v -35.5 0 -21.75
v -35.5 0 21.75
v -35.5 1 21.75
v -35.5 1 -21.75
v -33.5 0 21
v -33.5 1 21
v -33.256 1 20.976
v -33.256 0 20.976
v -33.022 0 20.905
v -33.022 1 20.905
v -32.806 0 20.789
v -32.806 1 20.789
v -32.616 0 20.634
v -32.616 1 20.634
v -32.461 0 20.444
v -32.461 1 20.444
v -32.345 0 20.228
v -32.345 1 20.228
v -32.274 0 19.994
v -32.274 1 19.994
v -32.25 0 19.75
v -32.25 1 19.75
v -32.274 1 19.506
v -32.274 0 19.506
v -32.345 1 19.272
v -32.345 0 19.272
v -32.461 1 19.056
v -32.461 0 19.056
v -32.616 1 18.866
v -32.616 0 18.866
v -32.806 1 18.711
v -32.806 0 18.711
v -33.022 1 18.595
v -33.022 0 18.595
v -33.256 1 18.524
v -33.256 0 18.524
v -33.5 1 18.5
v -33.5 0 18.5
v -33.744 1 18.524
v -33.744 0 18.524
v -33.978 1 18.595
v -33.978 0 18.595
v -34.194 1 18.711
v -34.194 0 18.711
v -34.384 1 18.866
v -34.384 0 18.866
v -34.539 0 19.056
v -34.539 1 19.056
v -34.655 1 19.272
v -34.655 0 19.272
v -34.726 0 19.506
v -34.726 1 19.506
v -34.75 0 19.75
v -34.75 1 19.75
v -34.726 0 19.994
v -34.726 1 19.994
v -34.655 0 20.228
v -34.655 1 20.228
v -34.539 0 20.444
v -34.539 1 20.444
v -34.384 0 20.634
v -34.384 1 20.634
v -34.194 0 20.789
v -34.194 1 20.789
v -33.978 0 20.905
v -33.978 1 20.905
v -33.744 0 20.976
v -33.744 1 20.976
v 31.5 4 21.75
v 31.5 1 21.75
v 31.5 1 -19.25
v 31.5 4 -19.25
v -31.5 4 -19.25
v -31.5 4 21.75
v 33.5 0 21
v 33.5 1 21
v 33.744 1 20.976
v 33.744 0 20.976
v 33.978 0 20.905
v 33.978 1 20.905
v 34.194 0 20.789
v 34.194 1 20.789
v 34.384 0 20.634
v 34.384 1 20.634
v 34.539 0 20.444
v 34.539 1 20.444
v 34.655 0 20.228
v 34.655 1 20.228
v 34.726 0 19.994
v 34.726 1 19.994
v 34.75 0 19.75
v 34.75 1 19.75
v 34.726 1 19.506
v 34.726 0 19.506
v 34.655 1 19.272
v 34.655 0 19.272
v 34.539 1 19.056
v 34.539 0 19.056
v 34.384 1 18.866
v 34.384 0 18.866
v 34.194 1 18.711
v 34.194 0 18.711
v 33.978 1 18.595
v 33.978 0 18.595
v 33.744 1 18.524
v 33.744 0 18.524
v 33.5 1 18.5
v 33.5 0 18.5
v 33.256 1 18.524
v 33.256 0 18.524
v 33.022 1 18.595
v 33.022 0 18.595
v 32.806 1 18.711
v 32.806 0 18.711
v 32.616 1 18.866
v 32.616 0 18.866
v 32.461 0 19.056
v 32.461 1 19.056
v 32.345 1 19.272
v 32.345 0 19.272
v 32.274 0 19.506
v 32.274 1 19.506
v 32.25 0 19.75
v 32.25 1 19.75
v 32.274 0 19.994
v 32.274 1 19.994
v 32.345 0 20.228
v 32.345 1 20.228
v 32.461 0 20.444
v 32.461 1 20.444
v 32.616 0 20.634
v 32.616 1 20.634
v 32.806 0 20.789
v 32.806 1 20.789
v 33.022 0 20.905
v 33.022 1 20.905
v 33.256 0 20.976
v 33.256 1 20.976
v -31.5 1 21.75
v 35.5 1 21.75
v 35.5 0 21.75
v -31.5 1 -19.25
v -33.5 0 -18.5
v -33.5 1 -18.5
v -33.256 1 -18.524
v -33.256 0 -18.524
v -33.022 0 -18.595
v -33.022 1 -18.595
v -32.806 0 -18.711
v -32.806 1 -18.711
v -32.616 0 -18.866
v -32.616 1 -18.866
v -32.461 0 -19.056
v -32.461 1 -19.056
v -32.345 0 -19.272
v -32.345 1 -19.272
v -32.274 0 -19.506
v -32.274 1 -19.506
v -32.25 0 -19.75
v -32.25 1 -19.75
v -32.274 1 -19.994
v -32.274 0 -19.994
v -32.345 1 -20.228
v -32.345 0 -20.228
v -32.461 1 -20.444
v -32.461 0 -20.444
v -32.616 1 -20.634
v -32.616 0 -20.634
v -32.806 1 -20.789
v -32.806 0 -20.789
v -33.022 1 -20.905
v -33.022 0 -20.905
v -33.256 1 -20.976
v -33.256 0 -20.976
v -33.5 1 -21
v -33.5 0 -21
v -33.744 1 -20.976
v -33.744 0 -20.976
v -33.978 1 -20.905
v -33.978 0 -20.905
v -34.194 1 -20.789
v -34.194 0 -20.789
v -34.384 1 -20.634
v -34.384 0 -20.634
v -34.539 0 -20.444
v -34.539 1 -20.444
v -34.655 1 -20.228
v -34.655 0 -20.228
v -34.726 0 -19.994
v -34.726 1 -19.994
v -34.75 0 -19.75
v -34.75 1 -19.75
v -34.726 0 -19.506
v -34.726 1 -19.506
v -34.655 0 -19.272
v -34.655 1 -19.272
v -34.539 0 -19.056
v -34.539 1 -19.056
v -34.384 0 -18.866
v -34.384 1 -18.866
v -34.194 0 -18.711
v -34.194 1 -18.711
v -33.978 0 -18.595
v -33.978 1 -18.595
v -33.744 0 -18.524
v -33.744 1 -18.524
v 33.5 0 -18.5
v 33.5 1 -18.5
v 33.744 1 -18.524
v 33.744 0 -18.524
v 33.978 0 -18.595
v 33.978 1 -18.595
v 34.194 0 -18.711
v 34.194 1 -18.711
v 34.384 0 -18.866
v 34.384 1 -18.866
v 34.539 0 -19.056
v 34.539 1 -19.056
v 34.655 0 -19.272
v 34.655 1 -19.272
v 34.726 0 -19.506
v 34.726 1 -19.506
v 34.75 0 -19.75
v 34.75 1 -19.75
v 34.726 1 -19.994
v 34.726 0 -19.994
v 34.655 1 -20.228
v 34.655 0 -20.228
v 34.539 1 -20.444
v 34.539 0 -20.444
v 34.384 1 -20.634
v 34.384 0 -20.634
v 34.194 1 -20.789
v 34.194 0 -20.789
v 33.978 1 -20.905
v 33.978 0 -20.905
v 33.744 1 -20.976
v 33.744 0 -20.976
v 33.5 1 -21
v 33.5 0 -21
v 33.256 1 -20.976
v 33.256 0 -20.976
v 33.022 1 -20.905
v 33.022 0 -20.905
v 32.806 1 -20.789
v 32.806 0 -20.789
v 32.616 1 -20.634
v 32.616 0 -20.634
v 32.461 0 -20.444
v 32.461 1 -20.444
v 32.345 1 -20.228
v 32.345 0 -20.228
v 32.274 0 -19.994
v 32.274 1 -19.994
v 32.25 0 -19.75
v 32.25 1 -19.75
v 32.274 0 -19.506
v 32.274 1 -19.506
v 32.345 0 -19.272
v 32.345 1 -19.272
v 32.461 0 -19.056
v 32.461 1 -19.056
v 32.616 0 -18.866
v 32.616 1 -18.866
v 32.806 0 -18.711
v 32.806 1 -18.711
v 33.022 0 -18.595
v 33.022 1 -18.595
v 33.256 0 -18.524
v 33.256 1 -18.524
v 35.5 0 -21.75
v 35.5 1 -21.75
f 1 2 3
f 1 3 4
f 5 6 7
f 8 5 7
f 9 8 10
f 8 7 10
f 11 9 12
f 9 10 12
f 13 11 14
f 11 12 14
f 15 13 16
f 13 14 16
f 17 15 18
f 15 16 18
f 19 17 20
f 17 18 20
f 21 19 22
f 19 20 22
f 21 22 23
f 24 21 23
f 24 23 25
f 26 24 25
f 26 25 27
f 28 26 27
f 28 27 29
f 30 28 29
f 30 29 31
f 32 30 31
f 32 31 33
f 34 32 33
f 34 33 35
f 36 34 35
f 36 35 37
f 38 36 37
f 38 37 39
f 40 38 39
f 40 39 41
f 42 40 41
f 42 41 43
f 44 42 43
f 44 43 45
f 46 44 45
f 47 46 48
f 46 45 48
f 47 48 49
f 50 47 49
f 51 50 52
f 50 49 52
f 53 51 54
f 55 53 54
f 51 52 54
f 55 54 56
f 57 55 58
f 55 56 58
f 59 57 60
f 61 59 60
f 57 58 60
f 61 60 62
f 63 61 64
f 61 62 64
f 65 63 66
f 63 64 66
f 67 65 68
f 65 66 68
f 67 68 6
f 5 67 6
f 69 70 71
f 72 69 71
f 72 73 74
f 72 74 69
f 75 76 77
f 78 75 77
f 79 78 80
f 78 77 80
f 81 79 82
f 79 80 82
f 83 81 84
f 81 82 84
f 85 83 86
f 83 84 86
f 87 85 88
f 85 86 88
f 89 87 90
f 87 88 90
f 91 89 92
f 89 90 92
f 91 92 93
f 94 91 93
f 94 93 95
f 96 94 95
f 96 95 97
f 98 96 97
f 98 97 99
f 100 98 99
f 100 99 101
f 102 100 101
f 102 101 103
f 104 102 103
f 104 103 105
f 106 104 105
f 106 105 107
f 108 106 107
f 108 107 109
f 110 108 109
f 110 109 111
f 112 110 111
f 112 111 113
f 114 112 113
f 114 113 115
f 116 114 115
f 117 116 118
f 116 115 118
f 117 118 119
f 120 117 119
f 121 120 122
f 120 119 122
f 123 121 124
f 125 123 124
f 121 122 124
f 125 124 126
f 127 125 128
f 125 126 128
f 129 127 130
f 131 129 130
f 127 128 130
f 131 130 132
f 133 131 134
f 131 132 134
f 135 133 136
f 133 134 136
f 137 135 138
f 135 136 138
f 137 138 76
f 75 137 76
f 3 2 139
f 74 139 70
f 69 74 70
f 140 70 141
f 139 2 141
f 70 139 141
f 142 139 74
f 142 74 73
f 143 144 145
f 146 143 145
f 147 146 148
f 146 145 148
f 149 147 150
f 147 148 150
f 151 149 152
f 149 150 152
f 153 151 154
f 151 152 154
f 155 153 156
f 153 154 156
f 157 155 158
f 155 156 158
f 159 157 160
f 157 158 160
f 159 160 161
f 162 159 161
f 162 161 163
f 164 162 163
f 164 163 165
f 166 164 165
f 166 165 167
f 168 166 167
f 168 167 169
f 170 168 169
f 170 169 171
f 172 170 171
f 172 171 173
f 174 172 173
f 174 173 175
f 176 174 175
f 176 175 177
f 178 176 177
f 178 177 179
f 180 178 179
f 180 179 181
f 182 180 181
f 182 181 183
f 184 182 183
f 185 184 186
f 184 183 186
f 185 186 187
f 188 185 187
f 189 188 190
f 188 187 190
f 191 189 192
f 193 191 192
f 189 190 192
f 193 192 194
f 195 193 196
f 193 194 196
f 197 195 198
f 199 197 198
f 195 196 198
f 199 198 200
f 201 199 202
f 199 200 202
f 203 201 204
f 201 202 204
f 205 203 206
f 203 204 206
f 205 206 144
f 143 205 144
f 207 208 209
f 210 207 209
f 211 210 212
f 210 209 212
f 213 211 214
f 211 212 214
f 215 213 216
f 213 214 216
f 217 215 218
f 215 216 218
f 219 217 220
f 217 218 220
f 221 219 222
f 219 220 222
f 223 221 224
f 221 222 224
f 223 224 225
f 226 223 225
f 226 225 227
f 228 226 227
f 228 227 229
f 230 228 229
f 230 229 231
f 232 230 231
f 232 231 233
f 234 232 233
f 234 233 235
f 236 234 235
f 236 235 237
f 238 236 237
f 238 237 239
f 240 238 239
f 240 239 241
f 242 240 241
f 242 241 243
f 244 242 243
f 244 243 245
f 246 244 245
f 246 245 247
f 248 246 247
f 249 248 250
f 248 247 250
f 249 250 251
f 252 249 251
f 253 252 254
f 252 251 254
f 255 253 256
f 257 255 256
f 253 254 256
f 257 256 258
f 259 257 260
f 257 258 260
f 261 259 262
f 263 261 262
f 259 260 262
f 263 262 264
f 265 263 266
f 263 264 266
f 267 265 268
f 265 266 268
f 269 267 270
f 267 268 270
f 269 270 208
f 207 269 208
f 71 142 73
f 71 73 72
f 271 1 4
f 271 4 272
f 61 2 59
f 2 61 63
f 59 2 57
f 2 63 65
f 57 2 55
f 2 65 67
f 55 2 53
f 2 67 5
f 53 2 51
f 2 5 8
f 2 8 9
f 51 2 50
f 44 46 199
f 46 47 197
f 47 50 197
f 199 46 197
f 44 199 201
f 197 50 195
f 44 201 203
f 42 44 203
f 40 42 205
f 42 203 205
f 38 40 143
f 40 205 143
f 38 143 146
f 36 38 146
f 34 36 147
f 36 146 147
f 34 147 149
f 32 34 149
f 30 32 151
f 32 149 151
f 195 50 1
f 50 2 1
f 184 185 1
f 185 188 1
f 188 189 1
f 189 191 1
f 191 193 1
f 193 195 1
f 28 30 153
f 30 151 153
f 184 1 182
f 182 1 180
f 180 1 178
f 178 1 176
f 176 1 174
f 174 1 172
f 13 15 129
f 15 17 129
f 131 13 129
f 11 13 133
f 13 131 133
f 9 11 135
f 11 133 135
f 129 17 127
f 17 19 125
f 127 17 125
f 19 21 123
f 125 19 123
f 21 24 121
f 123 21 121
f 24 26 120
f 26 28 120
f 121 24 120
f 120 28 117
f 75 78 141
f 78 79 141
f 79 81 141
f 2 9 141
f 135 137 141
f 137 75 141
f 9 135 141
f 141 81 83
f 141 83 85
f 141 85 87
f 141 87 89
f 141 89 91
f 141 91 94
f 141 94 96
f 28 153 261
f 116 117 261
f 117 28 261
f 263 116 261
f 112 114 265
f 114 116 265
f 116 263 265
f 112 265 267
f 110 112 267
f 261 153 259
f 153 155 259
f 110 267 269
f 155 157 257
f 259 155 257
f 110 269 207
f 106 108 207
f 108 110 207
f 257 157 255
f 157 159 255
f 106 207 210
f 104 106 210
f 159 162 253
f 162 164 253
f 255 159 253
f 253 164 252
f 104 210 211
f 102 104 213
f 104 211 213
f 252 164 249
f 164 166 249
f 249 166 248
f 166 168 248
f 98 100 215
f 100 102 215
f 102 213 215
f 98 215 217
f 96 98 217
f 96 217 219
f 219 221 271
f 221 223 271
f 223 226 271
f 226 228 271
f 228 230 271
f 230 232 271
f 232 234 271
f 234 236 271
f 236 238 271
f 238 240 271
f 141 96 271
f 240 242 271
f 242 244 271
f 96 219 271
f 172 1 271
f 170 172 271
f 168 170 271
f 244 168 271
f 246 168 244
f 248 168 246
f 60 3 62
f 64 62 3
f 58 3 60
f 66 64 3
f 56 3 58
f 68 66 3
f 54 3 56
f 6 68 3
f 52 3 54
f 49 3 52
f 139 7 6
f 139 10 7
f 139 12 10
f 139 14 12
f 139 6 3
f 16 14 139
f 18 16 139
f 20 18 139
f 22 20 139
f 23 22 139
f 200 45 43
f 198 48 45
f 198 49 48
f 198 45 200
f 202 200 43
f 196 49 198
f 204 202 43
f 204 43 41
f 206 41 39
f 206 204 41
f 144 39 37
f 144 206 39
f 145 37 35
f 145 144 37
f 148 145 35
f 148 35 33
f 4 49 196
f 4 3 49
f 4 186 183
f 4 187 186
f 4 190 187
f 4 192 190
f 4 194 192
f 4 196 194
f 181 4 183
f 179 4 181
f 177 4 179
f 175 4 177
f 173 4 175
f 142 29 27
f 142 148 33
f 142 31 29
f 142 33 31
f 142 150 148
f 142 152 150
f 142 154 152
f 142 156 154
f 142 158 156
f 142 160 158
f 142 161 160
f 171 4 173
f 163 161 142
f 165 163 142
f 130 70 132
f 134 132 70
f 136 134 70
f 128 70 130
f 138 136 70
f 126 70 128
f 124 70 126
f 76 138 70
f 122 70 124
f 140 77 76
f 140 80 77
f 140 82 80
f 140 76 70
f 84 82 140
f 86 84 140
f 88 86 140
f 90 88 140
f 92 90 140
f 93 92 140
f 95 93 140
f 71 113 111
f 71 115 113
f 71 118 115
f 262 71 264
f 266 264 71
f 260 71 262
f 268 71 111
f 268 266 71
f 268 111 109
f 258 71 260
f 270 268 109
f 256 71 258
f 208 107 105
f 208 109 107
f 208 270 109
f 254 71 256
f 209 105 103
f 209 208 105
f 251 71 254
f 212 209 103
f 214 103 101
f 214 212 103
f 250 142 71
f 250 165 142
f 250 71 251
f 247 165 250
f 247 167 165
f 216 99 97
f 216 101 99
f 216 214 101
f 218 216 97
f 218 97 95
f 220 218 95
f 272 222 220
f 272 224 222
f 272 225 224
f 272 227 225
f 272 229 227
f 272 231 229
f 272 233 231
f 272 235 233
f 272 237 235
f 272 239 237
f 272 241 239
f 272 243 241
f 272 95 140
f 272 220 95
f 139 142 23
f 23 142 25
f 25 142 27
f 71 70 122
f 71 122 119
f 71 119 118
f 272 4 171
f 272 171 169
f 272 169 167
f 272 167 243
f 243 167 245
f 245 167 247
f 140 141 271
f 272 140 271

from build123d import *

# Parameters (mm, degrees)
SKETCH_1_W          = 71
SKETCH_1_H          = 43.5
EXTRUDE_1_DEPTH     = 1
CUT_EXTRUDE_1_REACH = 43.645
SKETCH_6_R          = 1.25
SKETCH_4_W          = 63
SKETCH_4_H          = 41
EXTRUDE_2_DEPTH     = 3


with BuildPart() as part:
    # 草图1 → 凸台-拉伸1 (new body)
    with BuildSketch(Plane(origin=(0, 0, 0), x_dir=(1, 0, 0), z_dir=(0, 1, 0))):
        Rectangle(SKETCH_1_W, SKETCH_1_H)
    extrude(amount=EXTRUDE_1_DEPTH)

    # 草图6 → 切除-拉伸1 (cut, up to next)
    with BuildSketch(Plane(origin=(0, 1, 0), x_dir=(1, 0, 0), z_dir=(0, 1, 0)), mode=Mode.PRIVATE) as cut_extrude_1_sk1:
        with Locations(Location((-33.5, 19.75, 0), (0, 0, 270))):
            Circle(SKETCH_6_R)
    cut_extrude_1_tool1 = extrude(cut_extrude_1_sk1.sketch, amount=-CUT_EXTRUDE_1_REACH, mode=Mode.PRIVATE) & part.part
    # 草图6 → 切除-拉伸1 (cut, up to next)
    with BuildSketch(Plane(origin=(0, 1, 0), x_dir=(1, 0, 0), z_dir=(0, 1, 0)), mode=Mode.PRIVATE) as cut_extrude_1_sk2:
        with Locations(Location((33.5, 19.75, 0), (0, 0, 270))):
            Circle(SKETCH_6_R)
    cut_extrude_1_tool2 = extrude(cut_extrude_1_sk2.sketch, amount=-CUT_EXTRUDE_1_REACH, mode=Mode.PRIVATE) & part.part
    # 草图6 → 切除-拉伸1 (cut, up to next)
    with BuildSketch(Plane(origin=(0, 1, 0), x_dir=(1, 0, 0), z_dir=(0, 1, 0)), mode=Mode.PRIVATE) as cut_extrude_1_sk3:
        with Locations(Location((33.5, -19.75, 0), (0, 0, 270))):
            Circle(SKETCH_6_R)
    cut_extrude_1_tool3 = extrude(cut_extrude_1_sk3.sketch, amount=-CUT_EXTRUDE_1_REACH, mode=Mode.PRIVATE) & part.part
    # 草图6 → 切除-拉伸1 (cut, up to next)
    with BuildSketch(Plane(origin=(0, 1, 0), x_dir=(1, 0, 0), z_dir=(0, 1, 0)), mode=Mode.PRIVATE) as cut_extrude_1_sk4:
        with Locations(Location((-33.5, -19.75, 0), (0, 0, 270))):
            Circle(SKETCH_6_R)
    cut_extrude_1_tool4 = extrude(cut_extrude_1_sk4.sketch, amount=-CUT_EXTRUDE_1_REACH, mode=Mode.PRIVATE) & part.part
    add(cut_extrude_1_tool1.solids().sort_by_distance((-33.5, 1, -19.75))[0], mode=Mode.SUBTRACT)
    add(cut_extrude_1_tool2.solids().sort_by_distance((33.5, 1, -19.75))[0], mode=Mode.SUBTRACT)
    add(cut_extrude_1_tool3.solids().sort_by_distance((33.5, 1, 19.75))[0], mode=Mode.SUBTRACT)
    add(cut_extrude_1_tool4.solids().sort_by_distance((-33.5, 1, 19.75))[0], mode=Mode.SUBTRACT)

    # 草图4 → 凸台-拉伸2 (add)
    with BuildSketch(Plane(origin=(0, 1, 0), x_dir=(1, 0, 0), z_dir=(0, 1, 0))):
        with Locations((0, -1.25)):
            Rectangle(SKETCH_4_W, SKETCH_4_H)
    extrude(amount=EXTRUDE_2_DEPTH)


solid = part.part
